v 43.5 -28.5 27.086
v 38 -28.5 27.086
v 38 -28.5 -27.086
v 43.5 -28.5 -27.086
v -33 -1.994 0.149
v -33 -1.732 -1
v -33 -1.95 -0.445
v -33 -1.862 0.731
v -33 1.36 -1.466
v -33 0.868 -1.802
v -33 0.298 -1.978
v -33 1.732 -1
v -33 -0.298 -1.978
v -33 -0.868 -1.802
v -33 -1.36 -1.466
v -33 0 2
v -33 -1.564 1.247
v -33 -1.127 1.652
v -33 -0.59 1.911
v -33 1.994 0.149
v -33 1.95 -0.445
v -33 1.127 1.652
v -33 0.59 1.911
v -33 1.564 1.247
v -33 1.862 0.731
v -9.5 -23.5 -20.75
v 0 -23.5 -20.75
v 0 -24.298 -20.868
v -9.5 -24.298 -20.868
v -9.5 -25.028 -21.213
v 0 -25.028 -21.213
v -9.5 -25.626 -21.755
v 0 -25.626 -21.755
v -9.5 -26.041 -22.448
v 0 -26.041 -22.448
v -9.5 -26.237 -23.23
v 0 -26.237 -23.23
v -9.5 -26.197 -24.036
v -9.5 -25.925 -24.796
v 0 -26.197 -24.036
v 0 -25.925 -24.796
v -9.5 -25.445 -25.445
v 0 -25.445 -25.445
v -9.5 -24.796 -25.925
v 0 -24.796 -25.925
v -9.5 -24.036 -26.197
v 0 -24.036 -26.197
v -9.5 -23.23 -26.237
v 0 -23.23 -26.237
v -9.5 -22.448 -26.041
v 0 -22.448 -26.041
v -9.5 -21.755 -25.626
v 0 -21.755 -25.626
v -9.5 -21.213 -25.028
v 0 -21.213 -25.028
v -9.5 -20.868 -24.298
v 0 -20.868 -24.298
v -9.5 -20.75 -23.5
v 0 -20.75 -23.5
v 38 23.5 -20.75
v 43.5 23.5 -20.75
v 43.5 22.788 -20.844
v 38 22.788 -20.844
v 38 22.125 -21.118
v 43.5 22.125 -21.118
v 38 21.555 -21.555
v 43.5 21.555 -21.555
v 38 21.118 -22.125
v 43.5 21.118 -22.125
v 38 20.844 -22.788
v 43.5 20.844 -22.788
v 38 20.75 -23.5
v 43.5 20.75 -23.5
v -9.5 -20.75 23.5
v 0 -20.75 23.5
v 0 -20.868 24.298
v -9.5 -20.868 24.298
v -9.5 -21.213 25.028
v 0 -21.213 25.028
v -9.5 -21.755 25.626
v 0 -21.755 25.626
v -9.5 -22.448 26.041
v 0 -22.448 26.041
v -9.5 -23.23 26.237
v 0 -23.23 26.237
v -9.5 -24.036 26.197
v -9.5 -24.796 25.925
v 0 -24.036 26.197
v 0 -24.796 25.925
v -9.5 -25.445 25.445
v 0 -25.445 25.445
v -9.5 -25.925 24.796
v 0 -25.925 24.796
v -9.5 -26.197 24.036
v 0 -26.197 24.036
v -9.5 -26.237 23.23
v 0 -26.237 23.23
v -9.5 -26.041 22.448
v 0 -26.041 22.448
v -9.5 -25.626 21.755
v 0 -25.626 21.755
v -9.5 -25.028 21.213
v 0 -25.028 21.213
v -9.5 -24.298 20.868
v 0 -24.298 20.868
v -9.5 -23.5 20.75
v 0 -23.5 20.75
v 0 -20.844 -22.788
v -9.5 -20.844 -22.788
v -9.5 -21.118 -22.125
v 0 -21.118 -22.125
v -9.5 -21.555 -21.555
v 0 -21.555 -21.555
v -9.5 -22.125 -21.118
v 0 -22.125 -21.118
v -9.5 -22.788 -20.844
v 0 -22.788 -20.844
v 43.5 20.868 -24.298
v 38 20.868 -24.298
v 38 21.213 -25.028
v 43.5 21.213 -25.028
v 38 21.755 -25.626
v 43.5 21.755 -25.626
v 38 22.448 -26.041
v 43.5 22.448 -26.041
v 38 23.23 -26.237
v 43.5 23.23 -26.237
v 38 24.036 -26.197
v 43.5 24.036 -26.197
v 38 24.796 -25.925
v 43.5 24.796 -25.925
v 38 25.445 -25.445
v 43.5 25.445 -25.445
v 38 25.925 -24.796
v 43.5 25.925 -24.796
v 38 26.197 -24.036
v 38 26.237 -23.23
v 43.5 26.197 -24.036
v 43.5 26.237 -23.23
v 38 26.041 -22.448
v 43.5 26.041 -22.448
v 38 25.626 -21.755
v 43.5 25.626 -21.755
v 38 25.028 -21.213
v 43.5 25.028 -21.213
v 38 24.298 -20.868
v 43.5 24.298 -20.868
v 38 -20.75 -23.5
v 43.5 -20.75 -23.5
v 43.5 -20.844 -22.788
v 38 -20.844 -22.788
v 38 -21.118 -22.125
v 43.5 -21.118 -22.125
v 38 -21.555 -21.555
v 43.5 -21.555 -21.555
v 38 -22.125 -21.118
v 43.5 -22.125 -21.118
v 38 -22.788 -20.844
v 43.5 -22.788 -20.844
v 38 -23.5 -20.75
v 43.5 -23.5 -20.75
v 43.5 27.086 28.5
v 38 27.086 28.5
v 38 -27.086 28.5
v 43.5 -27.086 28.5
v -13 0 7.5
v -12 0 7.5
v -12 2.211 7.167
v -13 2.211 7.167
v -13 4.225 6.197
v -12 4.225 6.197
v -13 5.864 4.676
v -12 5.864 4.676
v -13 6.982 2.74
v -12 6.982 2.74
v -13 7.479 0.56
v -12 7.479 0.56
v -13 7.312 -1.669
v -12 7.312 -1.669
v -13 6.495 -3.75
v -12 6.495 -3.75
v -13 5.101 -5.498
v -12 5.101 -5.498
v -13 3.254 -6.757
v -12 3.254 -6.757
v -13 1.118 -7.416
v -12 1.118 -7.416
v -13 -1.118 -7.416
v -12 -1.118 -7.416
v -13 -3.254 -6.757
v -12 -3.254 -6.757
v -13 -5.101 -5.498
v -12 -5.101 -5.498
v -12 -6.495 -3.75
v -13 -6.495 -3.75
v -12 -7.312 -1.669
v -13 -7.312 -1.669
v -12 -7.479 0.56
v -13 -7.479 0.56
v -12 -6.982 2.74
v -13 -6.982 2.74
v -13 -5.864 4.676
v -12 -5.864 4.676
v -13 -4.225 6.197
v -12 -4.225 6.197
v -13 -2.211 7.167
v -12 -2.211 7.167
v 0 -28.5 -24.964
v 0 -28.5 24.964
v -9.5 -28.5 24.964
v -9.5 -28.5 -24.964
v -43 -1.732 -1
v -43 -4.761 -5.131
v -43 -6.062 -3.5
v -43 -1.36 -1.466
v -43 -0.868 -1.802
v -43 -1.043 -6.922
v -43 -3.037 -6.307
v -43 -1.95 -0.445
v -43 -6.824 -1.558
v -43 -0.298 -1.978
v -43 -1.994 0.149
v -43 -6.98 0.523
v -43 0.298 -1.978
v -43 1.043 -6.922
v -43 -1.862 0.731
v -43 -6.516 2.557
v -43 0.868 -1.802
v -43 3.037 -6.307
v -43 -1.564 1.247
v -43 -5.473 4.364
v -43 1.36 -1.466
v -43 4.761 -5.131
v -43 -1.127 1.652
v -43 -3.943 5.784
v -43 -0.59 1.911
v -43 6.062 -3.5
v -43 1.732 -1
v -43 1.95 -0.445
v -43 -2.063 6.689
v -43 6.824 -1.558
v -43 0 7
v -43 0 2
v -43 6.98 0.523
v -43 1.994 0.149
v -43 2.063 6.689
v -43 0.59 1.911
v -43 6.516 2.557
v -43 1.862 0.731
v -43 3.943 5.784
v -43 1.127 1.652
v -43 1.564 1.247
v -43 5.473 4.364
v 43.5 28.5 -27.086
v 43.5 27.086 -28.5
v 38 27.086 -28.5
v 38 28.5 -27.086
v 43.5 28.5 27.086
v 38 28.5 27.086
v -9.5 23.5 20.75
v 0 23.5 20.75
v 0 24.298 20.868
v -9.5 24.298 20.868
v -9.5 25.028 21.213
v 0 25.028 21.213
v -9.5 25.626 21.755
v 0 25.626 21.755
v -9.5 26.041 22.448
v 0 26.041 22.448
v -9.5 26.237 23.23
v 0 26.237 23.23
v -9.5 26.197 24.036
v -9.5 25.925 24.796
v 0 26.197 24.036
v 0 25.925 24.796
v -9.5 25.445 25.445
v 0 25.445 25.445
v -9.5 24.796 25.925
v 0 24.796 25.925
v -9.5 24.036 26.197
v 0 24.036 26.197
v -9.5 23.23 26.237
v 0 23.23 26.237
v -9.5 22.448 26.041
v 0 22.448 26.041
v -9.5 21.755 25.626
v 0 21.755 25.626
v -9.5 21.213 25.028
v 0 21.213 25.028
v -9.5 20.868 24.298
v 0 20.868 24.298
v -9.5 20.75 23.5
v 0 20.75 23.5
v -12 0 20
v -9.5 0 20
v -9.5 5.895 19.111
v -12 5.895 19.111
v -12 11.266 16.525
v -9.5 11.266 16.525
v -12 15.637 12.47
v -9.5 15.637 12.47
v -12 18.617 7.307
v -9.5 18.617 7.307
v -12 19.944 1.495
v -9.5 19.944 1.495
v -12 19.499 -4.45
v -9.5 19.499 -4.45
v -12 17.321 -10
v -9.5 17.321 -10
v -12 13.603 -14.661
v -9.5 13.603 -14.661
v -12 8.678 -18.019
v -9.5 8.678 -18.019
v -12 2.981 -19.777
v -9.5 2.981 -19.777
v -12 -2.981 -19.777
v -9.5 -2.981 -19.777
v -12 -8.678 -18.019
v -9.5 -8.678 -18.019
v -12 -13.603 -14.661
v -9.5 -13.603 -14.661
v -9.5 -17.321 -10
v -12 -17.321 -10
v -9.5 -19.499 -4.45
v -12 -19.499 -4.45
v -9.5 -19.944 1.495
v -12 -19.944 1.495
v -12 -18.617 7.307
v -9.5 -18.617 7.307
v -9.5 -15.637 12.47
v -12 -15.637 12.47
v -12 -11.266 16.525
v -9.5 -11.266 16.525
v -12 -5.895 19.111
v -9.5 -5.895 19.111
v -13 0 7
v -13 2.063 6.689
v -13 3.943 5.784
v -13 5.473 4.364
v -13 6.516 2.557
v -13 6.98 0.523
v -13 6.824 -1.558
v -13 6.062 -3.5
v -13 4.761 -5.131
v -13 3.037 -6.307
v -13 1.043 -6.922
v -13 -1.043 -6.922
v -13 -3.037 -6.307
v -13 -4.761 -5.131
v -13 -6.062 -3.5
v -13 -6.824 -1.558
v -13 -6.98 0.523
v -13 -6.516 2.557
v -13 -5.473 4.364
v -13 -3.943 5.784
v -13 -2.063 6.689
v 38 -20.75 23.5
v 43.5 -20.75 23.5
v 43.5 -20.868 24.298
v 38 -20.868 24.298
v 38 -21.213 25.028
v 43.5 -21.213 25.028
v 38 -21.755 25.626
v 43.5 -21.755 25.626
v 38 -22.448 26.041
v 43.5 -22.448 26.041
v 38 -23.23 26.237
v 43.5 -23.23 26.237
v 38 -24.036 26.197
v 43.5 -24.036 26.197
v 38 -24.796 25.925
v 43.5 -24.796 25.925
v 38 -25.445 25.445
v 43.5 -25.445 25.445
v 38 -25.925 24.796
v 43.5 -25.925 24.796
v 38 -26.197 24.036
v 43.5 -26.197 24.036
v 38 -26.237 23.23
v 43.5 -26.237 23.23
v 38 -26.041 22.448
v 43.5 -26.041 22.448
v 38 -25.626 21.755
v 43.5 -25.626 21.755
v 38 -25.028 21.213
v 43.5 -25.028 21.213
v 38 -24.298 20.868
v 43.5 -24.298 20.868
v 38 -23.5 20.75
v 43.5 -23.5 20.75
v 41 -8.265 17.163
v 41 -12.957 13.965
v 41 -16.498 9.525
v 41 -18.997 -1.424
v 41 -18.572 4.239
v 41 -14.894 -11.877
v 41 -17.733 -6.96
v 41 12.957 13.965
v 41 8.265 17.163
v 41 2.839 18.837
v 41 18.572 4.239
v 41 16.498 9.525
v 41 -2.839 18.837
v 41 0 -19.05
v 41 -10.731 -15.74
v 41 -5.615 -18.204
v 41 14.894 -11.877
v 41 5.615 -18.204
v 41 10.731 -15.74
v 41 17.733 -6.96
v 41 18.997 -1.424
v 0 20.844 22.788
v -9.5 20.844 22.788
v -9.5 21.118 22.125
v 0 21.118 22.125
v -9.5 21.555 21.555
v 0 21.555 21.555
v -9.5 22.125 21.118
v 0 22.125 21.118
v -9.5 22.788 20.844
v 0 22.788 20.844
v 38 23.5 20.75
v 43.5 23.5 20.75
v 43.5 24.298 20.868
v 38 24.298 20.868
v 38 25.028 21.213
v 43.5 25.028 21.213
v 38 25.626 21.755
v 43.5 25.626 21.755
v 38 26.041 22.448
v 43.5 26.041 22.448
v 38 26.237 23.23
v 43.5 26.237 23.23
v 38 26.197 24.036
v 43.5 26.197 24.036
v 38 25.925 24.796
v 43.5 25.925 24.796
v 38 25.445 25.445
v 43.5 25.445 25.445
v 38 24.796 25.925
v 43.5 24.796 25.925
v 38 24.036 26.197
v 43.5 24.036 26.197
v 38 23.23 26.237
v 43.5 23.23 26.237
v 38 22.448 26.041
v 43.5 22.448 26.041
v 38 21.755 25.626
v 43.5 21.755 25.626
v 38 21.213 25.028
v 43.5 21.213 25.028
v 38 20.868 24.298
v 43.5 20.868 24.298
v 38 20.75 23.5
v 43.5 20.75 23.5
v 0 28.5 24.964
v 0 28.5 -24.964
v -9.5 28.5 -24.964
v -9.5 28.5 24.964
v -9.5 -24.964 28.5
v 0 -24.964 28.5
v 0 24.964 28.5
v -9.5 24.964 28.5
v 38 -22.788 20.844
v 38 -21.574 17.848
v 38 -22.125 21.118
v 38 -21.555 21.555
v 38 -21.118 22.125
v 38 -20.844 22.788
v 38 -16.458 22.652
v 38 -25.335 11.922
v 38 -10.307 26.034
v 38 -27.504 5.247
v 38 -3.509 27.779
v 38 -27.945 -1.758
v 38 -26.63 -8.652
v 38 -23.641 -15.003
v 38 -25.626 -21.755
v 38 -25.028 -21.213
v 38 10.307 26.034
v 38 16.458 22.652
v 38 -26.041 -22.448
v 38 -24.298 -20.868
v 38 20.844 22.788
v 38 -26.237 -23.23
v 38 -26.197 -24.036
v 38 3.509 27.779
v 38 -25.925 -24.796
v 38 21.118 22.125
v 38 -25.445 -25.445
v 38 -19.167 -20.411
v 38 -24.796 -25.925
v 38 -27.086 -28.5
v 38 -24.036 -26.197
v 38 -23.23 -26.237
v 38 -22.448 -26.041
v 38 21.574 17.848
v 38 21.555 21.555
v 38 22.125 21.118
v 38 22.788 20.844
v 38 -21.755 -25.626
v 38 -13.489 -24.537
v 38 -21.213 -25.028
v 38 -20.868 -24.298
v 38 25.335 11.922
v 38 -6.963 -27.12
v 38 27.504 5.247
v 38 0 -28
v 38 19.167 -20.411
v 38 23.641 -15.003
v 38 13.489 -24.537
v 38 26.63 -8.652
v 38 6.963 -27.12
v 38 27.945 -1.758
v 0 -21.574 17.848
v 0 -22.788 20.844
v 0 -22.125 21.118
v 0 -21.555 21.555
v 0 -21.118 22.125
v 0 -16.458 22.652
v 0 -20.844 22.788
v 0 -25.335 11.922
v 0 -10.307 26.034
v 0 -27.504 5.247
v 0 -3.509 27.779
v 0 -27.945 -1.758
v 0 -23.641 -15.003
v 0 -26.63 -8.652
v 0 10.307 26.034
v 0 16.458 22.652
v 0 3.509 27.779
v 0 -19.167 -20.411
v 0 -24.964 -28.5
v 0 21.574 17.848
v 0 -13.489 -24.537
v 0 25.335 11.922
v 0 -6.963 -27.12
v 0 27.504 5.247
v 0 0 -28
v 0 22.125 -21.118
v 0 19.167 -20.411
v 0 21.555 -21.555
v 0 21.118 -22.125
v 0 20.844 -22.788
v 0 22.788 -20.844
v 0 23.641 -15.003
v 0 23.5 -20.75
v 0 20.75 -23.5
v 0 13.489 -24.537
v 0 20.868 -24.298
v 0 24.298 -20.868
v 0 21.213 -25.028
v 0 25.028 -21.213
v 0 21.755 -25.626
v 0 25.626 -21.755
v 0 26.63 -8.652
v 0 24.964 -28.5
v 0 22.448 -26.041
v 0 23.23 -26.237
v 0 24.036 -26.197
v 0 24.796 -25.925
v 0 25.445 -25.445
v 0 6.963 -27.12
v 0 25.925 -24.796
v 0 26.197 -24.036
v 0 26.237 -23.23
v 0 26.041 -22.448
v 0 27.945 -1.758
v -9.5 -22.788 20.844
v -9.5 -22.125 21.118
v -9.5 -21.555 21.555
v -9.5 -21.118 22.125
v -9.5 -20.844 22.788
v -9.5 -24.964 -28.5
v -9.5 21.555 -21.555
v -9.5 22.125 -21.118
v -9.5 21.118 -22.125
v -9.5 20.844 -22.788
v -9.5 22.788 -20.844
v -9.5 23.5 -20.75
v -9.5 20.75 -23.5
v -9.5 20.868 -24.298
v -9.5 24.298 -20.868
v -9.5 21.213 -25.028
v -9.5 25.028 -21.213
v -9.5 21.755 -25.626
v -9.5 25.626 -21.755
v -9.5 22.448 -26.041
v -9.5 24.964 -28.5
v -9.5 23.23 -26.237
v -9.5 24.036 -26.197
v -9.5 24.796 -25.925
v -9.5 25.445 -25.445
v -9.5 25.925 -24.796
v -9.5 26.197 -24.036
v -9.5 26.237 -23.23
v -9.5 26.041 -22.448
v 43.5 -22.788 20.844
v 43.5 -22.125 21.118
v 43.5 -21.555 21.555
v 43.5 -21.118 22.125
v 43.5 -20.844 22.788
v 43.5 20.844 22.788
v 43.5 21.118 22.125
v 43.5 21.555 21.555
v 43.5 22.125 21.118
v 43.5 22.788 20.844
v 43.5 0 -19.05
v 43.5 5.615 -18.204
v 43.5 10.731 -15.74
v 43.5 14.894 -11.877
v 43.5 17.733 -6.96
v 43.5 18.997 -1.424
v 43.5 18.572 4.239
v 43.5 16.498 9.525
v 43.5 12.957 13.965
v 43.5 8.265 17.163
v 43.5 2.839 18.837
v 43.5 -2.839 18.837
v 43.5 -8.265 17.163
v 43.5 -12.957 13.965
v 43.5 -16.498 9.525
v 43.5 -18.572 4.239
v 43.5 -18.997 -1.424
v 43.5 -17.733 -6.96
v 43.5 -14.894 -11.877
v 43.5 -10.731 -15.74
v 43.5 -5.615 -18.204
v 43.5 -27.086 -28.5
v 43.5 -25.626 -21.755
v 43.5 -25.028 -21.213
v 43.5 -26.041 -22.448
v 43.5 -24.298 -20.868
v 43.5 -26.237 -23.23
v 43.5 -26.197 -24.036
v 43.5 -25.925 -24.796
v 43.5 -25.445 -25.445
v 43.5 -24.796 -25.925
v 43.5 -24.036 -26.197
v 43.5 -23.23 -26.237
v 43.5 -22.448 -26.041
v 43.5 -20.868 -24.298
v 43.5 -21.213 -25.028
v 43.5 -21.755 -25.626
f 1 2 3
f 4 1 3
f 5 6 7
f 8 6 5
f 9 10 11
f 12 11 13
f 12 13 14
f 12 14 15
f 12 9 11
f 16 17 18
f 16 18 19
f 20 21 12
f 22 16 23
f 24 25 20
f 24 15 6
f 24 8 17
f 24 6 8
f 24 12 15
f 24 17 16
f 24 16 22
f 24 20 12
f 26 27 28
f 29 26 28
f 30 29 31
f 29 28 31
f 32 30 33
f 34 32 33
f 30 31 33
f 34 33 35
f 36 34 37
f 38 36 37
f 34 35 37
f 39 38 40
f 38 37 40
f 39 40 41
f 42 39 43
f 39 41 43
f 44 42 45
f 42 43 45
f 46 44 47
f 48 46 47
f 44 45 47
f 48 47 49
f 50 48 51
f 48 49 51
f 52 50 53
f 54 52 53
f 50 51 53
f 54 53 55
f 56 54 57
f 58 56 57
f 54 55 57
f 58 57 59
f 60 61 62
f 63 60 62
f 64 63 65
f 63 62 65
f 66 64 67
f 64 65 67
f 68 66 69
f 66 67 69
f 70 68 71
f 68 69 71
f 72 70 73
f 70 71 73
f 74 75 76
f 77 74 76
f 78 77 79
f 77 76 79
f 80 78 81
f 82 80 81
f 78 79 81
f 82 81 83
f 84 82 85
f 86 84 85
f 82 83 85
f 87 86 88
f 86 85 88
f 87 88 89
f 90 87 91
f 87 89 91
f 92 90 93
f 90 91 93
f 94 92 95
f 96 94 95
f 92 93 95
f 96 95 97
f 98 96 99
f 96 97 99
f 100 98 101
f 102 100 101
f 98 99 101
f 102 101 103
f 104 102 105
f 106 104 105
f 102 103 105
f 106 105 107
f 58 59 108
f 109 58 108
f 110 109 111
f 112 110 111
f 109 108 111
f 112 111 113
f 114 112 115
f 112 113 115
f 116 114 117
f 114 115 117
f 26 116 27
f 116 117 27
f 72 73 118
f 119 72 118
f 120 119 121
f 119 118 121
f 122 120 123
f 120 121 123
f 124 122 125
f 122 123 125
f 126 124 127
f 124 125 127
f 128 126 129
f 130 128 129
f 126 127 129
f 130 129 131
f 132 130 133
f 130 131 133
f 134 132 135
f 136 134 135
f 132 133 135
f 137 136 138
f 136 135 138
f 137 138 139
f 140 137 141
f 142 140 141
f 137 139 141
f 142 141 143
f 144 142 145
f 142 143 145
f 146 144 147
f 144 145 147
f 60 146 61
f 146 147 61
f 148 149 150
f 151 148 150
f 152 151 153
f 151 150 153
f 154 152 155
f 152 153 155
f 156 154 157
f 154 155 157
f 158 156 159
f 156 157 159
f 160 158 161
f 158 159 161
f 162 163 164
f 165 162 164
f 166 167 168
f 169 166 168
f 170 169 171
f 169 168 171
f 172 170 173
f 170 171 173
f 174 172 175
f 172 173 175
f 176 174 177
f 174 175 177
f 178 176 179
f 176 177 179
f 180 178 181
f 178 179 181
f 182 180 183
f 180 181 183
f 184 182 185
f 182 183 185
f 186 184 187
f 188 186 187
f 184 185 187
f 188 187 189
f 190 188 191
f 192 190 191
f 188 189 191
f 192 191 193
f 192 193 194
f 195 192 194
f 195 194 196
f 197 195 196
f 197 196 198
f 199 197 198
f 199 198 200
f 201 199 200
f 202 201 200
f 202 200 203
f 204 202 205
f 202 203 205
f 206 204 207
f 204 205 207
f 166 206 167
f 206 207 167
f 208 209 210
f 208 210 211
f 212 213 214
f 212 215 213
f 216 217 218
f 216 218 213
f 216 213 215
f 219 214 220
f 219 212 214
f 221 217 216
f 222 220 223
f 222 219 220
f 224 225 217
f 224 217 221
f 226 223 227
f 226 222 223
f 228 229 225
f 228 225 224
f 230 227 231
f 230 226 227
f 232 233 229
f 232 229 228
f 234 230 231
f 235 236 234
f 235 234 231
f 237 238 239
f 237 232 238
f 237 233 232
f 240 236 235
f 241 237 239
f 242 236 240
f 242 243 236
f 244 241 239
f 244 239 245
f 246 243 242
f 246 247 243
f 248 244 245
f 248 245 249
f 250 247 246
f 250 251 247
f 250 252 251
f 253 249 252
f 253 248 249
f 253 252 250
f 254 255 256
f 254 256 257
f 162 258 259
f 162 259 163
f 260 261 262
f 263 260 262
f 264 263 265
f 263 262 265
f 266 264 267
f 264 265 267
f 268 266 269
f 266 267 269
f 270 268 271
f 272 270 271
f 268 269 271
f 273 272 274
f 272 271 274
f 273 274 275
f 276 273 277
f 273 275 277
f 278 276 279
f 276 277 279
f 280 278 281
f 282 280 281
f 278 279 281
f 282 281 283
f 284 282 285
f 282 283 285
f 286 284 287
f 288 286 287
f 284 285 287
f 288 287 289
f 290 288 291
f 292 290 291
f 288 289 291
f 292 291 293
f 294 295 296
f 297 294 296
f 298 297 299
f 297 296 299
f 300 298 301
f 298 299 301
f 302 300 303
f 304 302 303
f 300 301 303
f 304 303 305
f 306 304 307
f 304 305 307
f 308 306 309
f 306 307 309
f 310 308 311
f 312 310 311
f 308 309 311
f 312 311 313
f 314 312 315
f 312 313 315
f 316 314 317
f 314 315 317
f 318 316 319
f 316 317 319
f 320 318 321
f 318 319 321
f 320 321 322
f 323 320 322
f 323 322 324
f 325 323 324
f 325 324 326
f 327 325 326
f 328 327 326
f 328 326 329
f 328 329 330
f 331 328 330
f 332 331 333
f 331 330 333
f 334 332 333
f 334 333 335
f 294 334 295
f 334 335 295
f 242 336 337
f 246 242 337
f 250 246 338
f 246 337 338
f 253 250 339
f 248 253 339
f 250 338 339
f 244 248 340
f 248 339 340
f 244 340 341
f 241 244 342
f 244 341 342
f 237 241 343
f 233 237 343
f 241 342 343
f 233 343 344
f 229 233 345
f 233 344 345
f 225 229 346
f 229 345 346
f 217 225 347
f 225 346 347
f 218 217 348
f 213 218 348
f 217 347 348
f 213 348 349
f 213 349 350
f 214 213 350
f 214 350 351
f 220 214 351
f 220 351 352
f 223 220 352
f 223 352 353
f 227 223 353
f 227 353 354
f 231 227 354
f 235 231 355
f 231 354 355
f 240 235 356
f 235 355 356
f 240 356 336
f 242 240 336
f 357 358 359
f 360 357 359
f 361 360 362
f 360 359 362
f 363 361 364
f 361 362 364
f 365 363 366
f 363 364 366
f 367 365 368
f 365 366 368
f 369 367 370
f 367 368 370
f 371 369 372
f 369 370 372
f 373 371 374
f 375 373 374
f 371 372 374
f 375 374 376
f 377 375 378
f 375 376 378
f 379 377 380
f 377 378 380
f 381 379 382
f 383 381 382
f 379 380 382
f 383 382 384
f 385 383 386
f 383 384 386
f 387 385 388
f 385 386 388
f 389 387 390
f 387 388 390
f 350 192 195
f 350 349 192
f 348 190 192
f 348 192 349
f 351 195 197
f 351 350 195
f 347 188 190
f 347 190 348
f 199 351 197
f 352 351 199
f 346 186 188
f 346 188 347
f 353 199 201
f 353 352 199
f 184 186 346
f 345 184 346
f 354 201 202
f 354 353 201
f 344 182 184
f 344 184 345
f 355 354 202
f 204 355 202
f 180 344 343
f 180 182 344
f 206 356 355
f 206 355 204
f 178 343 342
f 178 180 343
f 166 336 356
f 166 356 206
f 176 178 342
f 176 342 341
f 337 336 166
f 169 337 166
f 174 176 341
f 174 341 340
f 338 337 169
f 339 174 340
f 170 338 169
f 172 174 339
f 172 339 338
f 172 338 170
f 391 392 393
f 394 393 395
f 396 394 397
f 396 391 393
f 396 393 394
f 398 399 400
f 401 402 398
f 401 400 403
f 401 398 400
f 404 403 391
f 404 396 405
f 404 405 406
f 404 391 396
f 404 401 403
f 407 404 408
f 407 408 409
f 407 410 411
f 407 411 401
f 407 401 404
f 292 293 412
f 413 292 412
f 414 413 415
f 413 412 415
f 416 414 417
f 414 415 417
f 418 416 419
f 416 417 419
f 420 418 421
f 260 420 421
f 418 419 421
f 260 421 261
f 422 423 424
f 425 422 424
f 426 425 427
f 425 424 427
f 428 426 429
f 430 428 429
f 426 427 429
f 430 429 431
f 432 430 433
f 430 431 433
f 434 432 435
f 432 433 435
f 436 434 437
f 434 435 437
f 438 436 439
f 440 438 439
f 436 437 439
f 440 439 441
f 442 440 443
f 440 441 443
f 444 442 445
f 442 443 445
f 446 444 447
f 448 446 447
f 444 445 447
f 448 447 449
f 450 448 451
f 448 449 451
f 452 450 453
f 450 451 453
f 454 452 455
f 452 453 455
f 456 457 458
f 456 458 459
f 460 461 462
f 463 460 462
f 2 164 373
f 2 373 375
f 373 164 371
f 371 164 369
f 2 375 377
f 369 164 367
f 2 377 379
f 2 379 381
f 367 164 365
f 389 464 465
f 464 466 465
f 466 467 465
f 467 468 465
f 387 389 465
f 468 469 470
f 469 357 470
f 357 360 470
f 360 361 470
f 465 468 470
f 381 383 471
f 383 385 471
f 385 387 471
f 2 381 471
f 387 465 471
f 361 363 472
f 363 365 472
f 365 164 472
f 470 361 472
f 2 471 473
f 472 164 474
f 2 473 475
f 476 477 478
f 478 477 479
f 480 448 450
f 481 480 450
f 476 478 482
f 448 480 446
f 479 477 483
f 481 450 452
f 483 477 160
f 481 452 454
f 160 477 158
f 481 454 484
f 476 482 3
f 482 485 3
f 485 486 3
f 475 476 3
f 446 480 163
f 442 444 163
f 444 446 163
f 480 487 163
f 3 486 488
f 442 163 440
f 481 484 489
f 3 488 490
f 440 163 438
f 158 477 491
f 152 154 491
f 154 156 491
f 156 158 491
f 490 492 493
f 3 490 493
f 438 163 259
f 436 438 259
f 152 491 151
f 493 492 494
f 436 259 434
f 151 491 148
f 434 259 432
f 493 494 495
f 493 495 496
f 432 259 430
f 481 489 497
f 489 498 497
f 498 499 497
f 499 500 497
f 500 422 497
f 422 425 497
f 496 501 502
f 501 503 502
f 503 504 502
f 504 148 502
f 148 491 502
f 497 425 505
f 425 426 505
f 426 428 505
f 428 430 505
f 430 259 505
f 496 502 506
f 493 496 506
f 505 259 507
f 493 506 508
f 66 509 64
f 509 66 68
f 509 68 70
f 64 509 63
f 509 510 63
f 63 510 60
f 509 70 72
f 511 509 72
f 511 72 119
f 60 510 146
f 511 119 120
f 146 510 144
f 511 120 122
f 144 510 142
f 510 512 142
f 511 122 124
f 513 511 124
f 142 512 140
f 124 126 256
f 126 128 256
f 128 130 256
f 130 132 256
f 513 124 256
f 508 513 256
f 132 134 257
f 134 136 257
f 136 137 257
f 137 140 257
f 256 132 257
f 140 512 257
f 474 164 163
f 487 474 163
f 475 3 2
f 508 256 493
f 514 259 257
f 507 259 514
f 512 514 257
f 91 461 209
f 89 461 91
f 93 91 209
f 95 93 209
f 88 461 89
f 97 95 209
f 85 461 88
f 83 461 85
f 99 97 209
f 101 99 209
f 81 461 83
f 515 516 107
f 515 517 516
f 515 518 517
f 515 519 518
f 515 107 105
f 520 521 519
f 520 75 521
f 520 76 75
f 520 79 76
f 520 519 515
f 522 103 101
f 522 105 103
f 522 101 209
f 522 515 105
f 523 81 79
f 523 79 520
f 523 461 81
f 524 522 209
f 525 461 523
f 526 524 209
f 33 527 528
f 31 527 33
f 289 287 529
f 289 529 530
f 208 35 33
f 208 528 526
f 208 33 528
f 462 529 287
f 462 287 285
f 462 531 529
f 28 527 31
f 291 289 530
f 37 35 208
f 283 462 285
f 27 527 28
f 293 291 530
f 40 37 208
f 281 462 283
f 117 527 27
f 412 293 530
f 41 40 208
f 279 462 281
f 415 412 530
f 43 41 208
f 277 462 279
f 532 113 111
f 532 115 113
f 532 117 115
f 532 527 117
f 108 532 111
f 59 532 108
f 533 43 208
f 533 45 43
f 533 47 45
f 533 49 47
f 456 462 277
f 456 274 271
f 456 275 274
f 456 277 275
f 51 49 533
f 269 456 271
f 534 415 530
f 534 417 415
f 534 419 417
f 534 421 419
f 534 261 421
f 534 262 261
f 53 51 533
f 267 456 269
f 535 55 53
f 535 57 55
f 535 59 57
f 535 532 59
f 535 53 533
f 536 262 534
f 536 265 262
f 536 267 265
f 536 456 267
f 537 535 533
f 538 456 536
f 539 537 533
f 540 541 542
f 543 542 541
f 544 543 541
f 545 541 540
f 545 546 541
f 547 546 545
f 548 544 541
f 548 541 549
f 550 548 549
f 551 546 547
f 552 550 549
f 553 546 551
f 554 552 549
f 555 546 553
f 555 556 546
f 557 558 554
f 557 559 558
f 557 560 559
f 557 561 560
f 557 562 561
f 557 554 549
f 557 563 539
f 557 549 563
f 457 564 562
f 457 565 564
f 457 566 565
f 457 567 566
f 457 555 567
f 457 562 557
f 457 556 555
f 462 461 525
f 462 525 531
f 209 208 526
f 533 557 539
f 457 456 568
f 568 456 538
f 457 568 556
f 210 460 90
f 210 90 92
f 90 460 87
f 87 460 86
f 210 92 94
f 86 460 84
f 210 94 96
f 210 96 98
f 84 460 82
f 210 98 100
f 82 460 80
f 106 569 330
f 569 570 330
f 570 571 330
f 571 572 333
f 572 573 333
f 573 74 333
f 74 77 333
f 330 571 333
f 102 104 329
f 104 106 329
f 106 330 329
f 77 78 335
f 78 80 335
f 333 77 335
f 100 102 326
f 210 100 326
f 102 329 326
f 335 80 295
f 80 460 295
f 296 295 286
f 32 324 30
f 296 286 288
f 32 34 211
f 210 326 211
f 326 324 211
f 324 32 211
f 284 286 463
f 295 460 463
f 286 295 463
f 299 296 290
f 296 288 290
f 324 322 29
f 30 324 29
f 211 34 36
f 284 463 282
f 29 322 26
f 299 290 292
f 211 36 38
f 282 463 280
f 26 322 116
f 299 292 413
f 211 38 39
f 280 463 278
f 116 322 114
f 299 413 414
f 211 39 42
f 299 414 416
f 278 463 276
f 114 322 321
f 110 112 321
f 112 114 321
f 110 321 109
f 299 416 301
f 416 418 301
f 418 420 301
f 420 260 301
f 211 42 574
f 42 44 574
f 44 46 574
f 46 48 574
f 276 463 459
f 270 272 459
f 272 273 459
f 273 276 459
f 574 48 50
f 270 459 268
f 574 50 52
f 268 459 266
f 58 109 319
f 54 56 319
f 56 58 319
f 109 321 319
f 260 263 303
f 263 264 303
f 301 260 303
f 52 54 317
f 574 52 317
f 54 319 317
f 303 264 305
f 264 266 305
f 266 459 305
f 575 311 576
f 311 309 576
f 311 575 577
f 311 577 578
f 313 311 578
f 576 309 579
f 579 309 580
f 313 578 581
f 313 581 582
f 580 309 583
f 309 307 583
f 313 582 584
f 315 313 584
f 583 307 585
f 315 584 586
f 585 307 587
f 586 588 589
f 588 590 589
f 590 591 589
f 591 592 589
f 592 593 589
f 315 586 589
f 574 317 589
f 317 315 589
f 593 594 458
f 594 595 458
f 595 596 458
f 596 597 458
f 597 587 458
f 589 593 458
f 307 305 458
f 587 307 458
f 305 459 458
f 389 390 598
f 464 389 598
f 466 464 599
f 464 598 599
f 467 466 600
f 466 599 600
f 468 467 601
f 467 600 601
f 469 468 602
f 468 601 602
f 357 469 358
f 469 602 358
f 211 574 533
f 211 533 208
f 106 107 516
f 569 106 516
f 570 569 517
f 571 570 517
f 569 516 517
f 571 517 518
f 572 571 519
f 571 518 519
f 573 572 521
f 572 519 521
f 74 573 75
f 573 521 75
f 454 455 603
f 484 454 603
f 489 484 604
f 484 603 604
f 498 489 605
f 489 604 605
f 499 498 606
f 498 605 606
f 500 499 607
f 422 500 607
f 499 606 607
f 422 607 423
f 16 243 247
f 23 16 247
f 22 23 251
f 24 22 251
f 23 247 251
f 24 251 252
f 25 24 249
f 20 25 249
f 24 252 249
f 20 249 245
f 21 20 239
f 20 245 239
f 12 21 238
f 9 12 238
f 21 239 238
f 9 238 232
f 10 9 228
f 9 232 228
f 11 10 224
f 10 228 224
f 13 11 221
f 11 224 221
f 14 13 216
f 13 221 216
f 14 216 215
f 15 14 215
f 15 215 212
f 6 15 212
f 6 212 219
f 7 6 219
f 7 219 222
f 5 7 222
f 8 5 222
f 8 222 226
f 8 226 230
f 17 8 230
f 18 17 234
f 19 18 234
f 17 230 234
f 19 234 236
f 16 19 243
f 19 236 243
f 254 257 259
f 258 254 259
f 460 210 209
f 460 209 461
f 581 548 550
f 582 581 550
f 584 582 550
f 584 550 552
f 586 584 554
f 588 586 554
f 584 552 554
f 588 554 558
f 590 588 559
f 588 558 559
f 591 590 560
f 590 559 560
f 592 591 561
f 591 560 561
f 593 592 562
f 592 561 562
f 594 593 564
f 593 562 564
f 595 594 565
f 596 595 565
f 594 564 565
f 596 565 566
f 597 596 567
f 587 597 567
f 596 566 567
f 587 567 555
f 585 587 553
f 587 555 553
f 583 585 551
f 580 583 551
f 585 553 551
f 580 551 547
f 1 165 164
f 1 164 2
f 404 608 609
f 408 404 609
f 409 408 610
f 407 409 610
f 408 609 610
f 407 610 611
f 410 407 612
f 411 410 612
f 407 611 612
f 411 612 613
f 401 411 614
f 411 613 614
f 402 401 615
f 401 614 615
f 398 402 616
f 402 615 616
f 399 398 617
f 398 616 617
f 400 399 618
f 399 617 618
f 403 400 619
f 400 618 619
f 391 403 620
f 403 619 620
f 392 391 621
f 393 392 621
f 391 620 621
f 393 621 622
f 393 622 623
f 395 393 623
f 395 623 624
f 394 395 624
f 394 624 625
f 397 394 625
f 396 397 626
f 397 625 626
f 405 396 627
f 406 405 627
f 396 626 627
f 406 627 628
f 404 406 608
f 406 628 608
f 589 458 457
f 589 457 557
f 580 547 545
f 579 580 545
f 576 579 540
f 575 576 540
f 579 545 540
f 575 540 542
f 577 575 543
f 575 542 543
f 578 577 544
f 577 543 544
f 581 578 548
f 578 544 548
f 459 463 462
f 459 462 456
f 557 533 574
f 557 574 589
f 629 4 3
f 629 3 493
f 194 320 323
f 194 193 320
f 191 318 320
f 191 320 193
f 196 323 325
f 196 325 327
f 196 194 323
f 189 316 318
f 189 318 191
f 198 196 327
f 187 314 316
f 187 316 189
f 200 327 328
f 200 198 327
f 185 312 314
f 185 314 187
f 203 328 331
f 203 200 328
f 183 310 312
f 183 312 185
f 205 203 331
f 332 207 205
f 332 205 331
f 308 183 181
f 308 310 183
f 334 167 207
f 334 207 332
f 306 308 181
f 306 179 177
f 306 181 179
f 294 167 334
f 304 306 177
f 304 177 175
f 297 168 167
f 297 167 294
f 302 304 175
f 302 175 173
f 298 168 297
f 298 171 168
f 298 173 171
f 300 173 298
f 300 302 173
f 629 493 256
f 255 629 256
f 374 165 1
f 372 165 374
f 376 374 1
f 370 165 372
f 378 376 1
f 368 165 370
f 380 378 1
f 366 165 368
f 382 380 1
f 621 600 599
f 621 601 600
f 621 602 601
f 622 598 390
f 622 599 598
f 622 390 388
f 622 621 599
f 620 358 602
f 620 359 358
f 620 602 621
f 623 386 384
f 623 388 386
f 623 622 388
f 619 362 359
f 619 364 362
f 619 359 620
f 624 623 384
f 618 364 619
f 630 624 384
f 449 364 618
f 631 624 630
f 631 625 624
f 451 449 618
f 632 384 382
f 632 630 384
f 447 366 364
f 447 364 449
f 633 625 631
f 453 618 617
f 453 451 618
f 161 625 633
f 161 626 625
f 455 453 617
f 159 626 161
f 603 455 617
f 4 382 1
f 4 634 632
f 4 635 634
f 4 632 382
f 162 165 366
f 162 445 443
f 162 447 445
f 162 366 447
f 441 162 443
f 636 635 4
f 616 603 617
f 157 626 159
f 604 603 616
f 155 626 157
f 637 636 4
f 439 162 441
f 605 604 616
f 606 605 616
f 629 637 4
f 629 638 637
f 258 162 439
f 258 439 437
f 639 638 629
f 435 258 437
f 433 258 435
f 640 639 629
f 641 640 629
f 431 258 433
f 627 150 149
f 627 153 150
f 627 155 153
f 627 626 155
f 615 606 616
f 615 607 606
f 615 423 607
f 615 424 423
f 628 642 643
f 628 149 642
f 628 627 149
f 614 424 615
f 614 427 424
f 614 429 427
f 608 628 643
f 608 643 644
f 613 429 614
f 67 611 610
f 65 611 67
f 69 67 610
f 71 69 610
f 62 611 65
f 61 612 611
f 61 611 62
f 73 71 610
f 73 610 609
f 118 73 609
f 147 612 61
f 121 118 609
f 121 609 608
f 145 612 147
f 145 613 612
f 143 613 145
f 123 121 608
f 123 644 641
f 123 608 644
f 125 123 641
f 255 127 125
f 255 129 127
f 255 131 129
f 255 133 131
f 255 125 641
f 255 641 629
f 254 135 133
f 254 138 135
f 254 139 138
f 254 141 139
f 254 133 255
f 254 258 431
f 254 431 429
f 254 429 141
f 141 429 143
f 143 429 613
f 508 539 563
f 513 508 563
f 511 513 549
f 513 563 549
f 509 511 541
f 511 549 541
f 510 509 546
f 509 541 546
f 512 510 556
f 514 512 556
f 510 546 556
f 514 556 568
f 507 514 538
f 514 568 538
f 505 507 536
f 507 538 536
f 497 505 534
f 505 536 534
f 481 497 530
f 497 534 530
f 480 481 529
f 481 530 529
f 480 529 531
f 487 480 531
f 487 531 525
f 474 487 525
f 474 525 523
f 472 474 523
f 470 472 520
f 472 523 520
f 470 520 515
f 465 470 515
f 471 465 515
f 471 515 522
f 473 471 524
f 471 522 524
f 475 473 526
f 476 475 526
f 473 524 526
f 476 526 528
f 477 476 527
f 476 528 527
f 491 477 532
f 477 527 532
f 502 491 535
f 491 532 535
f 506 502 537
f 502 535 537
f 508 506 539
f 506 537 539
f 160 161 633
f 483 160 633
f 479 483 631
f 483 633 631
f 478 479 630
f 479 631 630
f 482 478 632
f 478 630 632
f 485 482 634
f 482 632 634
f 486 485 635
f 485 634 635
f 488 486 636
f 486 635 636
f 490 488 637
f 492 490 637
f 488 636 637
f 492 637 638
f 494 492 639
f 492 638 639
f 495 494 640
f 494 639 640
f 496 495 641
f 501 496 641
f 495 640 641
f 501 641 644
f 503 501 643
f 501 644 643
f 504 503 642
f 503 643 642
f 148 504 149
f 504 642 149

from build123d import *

# Parameters (mm, degrees)
SKETCH1_R           = 28
BOSS_EXTRUDE1_DEPTH = 38
BOSS_EXTRUDE2_DEPTH = 5.5
SKETCH4_R           = 19.05
CUT_EXTRUDE1_DEPTH  = 2.5
CUT_EXTRUDE2_DEPTH  = 5.5
CIRPATTERN1_COUNT   = 4
BOSS_EXTRUDE3_DEPTH = 9.5
CUT_EXTRUDE3_DEPTH  = 9.5
CIRPATTERN2_COUNT   = 4
SKETCH8_R           = 20
BOSS_EXTRUDE4_DEPTH = 2.5
SKETCH9_R           = 7.5
BOSS_EXTRUDE5_DEPTH = 1
SKETCH10_R          = 7
BOSS_EXTRUDE6_DEPTH = 30
SKETCH11_R          = 2
CUT_EXTRUDE4_DEPTH  = 10
CUT_EXTRUDE5_DEPTH  = 60
CIRPATTERN3_COUNT   = 4


with BuildPart() as part:
    # Sketch1 → Boss-Extrude1 (new body)
    with BuildSketch(Plane(origin=(0, 0, 0), x_dir=(0, 0, -1), z_dir=(1, 0, 0))):
        Circle(SKETCH1_R)
    extrude(amount=BOSS_EXTRUDE1_DEPTH)

    # Sketch2 → Boss-Extrude2 (add)
    with BuildSketch(Plane(origin=(38, 0, 0), x_dir=(0, 0, -1), z_dir=(1, 0, 0))):
        Polygon((28.5, 0), (28.5, 28.5), (-28.5, 28.5), (-28.5, -28.5), (28.5, -28.5), align=None)
    extrude(amount=BOSS_EXTRUDE2_DEPTH)

    # Sketch4 → Cut-Extrude1 (cut)
    with BuildSketch(Plane(origin=(43.5, 0, 0), x_dir=(0, 0, -1), z_dir=(1, 0, 0))):
        Circle(SKETCH4_R)
    extrude(amount=-CUT_EXTRUDE1_DEPTH, mode=Mode.SUBTRACT)

    # Sketch5 → Cut-Extrude2 (cut)
    with BuildSketch(Plane(origin=(43.5, 0, 0), x_dir=(0, 0, -1), z_dir=(1, 0, 0))):
        Polygon((-27.085786438, 28.5), (-28.5, 27.085786438), (-28.5, 28.5), align=None)
    cut_extrude2 = extrude(amount=-CUT_EXTRUDE2_DEPTH, mode=Mode.SUBTRACT)

    # CirPattern1: Cut-Extrude2 ×4 about axis
    cirpattern1_axis = Axis((0, 0, 0), (1, 0, 0))
    for i in range(1, CIRPATTERN1_COUNT):
        add(cut_extrude2.rotate(cirpattern1_axis, i * 360 / CIRPATTERN1_COUNT), mode=Mode.SUBTRACT)

    # Sketch6 → Boss-Extrude3 (add)
    with BuildSketch(Plane.ZY):
        Polygon((28.5, 0), (28.5, -28.5), (-28.5, -28.5), (-28.5, 28.5), (28.5, 28.5), align=None)
    extrude(amount=BOSS_EXTRUDE3_DEPTH)

    # Sketch7 → Cut-Extrude3 (cut)
    with BuildSketch(Plane.ZY.offset(9.5)):
        Polygon((-24.964466094, 28.5), (-28.5, 24.964466094), (-28.5, 28.5), align=None)
    cut_extrude3 = extrude(amount=-CUT_EXTRUDE3_DEPTH, mode=Mode.SUBTRACT)

    # CirPattern2: Cut-Extrude3 ×4 about axis
    cirpattern2_axis = Axis((0, 0, 0), (1, 0, 0))
    for i in range(1, CIRPATTERN2_COUNT):
        add(cut_extrude3.rotate(cirpattern2_axis, i * 360 / CIRPATTERN2_COUNT), mode=Mode.SUBTRACT)

    # Sketch8 → Boss-Extrude4 (add)
    with BuildSketch(Plane.ZY.offset(9.5)):
        Circle(SKETCH8_R)
    extrude(amount=BOSS_EXTRUDE4_DEPTH)

    # Sketch9 → Boss-Extrude5 (add)
    with BuildSketch(Plane.ZY.offset(12)):
        Circle(SKETCH9_R)
    extrude(amount=BOSS_EXTRUDE5_DEPTH)

    # Sketch10 → Boss-Extrude6 (add)
    with BuildSketch(Plane.ZY.offset(13)):
        Circle(SKETCH10_R)
    extrude(amount=BOSS_EXTRUDE6_DEPTH)

    # Sketch11 → Cut-Extrude4 (cut)
    with BuildSketch(Plane.ZY.offset(43)):
        Circle(SKETCH11_R)
    extrude(amount=-CUT_EXTRUDE4_DEPTH, mode=Mode.SUBTRACT)

    # Sketch12 → Cut-Extrude5 (cut)
    with BuildSketch(Plane(origin=(43.5, 0, 0), x_dir=(0, 0, -1), z_dir=(1, 0, 0))):
        with BuildLine():
            ThreePointArc((-23.5, 20.75), (-21.555456352, 21.555456352), (-20.75, 23.5))
            Line((-20.75, 23.5), (-23.5, 23.5))
            Line((-23.5, 23.5), (-23.5, 20.75))
        make_face()
        with BuildLine():
            Line((-23.5, 23.5), (-20.75, 23.5))
            ThreePointArc((-20.75, 23.5), (-25.444543648, 25.444543648), (-23.5, 20.75))
            Line((-23.5, 20.75), (-23.5, 23.5))
        make_face()
    cut_extrude5 = extrude(amount=-CUT_EXTRUDE5_DEPTH, mode=Mode.SUBTRACT)

    # CirPattern3: Cut-Extrude5 ×4 about axis
    cirpattern3_axis = Axis((0, 0, 0), (1, 0, 0))
    for i in range(1, CIRPATTERN3_COUNT):
        add(cut_extrude5.rotate(cirpattern3_axis, i * 360 / CIRPATTERN3_COUNT), mode=Mode.SUBTRACT)


solid = part.part
